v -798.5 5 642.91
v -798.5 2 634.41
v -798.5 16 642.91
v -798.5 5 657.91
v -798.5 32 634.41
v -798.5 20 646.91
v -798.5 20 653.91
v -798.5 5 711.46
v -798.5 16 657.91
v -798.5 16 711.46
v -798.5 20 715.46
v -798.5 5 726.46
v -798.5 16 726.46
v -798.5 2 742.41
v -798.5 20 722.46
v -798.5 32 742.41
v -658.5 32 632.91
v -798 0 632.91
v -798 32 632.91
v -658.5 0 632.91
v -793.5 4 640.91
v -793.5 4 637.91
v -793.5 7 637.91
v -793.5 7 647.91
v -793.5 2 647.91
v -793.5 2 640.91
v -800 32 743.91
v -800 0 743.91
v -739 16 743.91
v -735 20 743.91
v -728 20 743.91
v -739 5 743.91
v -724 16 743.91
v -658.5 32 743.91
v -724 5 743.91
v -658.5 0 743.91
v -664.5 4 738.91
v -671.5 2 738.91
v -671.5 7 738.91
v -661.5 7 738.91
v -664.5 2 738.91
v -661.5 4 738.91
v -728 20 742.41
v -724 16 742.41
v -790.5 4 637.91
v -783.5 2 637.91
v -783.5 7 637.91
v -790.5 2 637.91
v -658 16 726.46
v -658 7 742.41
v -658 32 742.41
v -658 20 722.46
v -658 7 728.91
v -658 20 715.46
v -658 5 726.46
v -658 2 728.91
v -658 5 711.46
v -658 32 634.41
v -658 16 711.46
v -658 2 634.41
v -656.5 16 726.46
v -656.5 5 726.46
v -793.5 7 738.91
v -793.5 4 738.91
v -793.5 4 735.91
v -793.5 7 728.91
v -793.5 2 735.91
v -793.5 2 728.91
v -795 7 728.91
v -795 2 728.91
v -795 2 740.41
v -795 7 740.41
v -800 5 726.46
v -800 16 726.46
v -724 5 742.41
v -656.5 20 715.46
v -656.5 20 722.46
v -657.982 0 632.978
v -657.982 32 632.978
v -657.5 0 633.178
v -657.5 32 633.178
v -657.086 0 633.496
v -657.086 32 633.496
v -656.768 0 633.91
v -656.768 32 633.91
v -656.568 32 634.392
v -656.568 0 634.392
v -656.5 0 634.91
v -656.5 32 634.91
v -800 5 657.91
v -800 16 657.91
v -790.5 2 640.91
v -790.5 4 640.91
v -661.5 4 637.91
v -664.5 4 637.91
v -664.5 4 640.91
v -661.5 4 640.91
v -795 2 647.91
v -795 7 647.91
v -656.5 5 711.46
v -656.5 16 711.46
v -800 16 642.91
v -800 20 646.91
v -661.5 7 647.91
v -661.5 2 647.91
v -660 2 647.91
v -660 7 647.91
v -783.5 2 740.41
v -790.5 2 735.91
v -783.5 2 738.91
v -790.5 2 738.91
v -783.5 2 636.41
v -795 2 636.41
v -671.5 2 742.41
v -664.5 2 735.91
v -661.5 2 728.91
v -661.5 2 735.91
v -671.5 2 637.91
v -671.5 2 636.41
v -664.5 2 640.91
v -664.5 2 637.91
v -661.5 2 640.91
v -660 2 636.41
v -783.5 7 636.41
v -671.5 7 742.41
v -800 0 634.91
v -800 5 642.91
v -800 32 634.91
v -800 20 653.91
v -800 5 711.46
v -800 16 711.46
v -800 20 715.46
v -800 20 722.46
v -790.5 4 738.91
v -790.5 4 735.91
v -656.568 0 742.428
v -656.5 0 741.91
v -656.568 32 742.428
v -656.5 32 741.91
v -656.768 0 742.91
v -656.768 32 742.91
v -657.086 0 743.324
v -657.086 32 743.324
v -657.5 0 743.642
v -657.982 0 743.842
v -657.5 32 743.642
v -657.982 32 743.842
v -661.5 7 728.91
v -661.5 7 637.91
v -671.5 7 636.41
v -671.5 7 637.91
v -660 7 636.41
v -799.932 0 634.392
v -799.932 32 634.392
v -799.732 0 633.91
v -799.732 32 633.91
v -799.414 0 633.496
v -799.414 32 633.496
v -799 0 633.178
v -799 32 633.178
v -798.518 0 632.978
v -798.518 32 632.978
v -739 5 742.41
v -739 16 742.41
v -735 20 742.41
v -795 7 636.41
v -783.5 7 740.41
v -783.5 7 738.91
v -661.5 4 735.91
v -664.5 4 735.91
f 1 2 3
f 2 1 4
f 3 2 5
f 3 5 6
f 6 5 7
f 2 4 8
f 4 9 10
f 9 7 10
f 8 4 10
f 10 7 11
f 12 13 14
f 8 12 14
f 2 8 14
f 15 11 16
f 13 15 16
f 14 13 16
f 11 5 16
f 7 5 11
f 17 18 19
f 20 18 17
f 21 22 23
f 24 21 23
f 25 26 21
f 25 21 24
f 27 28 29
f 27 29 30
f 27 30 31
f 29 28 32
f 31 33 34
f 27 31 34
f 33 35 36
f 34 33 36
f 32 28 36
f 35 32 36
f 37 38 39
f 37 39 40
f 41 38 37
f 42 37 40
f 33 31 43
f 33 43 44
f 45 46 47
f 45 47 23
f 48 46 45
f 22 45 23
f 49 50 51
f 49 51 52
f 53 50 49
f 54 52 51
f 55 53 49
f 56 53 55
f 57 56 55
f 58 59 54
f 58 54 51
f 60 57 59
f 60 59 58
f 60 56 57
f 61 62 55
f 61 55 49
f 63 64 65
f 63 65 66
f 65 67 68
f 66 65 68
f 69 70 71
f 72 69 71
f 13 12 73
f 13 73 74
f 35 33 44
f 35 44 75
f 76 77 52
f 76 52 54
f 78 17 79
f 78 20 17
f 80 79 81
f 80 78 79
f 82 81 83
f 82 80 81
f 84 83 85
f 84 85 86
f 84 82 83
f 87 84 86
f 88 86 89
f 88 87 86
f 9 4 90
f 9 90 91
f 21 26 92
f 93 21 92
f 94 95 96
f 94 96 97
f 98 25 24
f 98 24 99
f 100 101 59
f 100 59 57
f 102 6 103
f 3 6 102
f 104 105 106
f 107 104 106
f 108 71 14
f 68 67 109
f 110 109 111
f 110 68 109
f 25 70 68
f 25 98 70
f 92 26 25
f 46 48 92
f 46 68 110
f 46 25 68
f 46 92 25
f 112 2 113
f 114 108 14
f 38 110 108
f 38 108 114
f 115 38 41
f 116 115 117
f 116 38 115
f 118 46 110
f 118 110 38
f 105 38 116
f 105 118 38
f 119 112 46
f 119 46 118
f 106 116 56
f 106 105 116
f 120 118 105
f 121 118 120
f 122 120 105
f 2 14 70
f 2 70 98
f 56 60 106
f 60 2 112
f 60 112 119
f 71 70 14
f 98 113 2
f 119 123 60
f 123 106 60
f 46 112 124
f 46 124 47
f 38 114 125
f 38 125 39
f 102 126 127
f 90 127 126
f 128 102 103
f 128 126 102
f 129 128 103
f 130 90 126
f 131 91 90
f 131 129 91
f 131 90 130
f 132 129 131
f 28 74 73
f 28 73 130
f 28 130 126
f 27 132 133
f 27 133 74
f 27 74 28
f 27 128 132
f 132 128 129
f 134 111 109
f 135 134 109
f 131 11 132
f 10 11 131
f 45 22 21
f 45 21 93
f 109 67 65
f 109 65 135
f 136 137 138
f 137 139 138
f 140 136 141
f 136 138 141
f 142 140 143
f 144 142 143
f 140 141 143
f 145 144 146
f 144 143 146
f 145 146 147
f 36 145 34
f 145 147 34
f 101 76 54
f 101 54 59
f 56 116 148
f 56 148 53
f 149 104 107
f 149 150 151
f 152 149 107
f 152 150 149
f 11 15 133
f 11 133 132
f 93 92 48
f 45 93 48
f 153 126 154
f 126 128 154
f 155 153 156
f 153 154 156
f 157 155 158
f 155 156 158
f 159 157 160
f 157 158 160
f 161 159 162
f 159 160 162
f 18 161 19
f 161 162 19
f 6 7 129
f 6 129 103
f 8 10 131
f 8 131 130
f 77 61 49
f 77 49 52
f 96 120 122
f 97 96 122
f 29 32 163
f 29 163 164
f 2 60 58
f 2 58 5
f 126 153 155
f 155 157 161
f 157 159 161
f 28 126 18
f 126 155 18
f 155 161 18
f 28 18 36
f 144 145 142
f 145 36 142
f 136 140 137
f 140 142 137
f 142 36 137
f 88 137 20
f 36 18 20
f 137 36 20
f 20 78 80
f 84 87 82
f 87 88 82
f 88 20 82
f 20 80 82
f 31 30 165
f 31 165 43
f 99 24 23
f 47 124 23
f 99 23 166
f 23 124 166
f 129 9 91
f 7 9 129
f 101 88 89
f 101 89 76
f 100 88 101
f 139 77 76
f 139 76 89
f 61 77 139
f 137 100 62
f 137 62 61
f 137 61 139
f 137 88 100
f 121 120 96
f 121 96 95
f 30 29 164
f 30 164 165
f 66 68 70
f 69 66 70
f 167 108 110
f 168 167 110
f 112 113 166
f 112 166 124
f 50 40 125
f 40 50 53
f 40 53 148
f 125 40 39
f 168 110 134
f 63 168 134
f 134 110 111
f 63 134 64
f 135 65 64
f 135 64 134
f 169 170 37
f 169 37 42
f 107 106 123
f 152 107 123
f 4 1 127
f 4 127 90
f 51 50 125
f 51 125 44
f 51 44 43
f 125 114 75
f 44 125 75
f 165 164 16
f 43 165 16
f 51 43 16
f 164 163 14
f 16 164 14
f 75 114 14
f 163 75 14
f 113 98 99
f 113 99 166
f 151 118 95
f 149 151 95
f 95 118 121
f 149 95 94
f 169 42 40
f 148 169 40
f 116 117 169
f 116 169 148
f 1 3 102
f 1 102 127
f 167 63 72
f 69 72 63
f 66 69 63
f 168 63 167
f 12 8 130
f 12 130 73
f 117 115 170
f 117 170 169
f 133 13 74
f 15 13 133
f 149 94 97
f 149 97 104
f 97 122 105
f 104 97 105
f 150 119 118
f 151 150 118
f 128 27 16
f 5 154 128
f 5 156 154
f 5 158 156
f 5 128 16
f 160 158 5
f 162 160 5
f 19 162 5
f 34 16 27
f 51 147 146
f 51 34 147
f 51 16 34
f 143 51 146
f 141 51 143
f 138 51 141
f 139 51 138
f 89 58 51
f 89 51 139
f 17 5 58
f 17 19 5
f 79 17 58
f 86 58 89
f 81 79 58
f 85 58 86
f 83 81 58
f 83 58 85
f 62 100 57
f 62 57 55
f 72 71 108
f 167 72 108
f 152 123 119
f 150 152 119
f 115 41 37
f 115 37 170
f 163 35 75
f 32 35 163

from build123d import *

# Parameters (mm, degrees)
SKETCH1_W                = 1600
SKETCH1_H                = 1600
BOSS_EXTRUDE1_DEPTH      = 2
SKETCH2_R                = 1.585
BOSS_EXTRUDE2_DEPTH      = 5
SKETCH3_W                = 1.5
SKETCH3_H                = 10.8
SKETCH3_H_2              = 16.825
BOSS_EXTRUDE3_DEPTH      = 30
CUT_EXTRUDE1_DEPTH       = 1132.768527571
CUT_EXTRUDE1_DEPTH_BACK  = 1132.768527571
SKETCH5_OUTSIDE_W        = 2054.594
SKETCH5_OUTSIDE_H        = 2054.594
SKETCH5_OUTSIDE_W_2      = 200
SKETCH5_OUTSIDE_H_2      = 200
SKETCH6_W                = 200
SKETCH6_H                = 97
BOSS_EXTRUDE4_DEPTH      = 2
BOSS_EXTRUDE6_DEPTH      = 30
CUT_EXTRUDE7_START       = -2
CUT_EXTRUDE7_DEPTH       = 32
SKETCH15_W               = 48.54
SKETCH15_H               = 10.95
BOSS_EXTRUDE8_DEPTH      = 1.5
CHAMFER1_SIZE            = 3
CUT_EXTRUDE9_DEPTH       = 1132.768527571
CUT_EXTRUDE9_DEPTH_BACK  = 1132.768527571
SKETCH16_W               = 83.170959918
SKETCH16_H               = 74.318470717
BOSS_EXTRUDE9_DEPTH      = 30
CUT_EXTRUDE8_DEPTH       = 814.397965328
CUT_EXTRUDE8_DEPTH_BACK  = 814.397965328
SKETCH18_W               = 20.53541424
SKETCH18_H               = 18.617271152
BOSS_EXTRUDE10_DEPTH     = 1.5
BOSS_EXTRUDE11_DEPTH     = 5
SKETCH20_W               = 3
SKETCH20_H               = 3
BOSS_EXTRUDE12_DEPTH     = 2
FILLET1_R                = 2
BOSS_EXTRUDE13_DEPTH     = 30
CUT_EXTRUDE10_DEPTH      = 1132.823307765
CUT_EXTRUDE10_DEPTH_BACK = 1132.823307765
SKETCH22_W               = 118.842145749
SKETCH22_H               = 72.51699158
CUT_EXTRUDE11_DEPTH      = 20


# Read off the part's stored shape, not the designer's step: Cut-Extrude7
with BuildPart() as part:
    # Sketch1 → Boss-Extrude1 (new body)
    with BuildSketch(Plane(origin=(0, 0, 0), x_dir=(1, 0, 0), z_dir=(0, 1, 0))):
        Rectangle(SKETCH1_W, SKETCH1_H)
    extrude(amount=BOSS_EXTRUDE1_DEPTH)

    # Sketch2 → Boss-Extrude2 (add)
    with BuildSketch(Plane(origin=(0, 2, 0), x_dir=(1, 0, 0), z_dir=(0, 1, 0))):
        with Locations(Location((-782.85, -746.2, 0), (0, 0, 270))):
            Circle(SKETCH2_R)
        with Locations(Location((-732.05, -761.44, 0), (0, 0, 270))):
            Circle(SKETCH2_R)
        with Locations(Location((-784.12, -794.46, 0), (0, 0, 270))):
            Circle(SKETCH2_R)
        with Locations(Location((-732.05, -789.38, 0), (0, 0, 270))):
            Circle(SKETCH2_R)
    extrude(amount=BOSS_EXTRUDE2_DEPTH)

    # Sketch3 → Boss-Extrude3 (add)
    with BuildSketch(Plane(origin=(0, 2, 0), x_dir=(1, 0, 0), z_dir=(0, 1, 0))):
        with Locations((-799.25, -746.06)):
            Rectangle(SKETCH3_W, SKETCH3_H)
        Polygon((-798.5, -800), (-800, -800), (-800, -795.325), (-798.5, -795.325), (-798.5, -798.5), (-648.5, -798.5), (-648.5, -800), align=None)
        with Locations((-799.25, -774.9125)):
            Rectangle(SKETCH3_W, SKETCH3_H_2)
    extrude(amount=BOSS_EXTRUDE3_DEPTH)

    # Sketch5 outside → Cut-Extrude1 (cut, two sides: drawn at the far end of the back side and taken through both)
    with BuildSketch(Plane(origin=(0, 2, 0), x_dir=(1, 0, 0), z_dir=(0, 1, 0)).offset(-CUT_EXTRUDE1_DEPTH_BACK)):
        Rectangle(SKETCH5_OUTSIDE_W, SKETCH5_OUTSIDE_H)
        with Locations((-700, -700)):
            Rectangle(SKETCH5_OUTSIDE_W_2, SKETCH5_OUTSIDE_H_2, mode=Mode.SUBTRACT)
    extrude(amount=CUT_EXTRUDE1_DEPTH + CUT_EXTRUDE1_DEPTH_BACK, mode=Mode.SUBTRACT)

    # Sketch6 → Boss-Extrude4 (add)
    with BuildSketch(Plane(origin=(0, 2, 0), x_dir=(1, 0, 0), z_dir=(0, 1, 0))):
        with Locations((-698.5, -652.5)):
            Rectangle(SKETCH6_W, SKETCH6_H)
    extrude(amount=-BOSS_EXTRUDE4_DEPTH)

    # Sketch7 → Boss-Extrude6 (add)
    with BuildSketch(Plane(origin=(0, 2, 0), x_dir=(1, 0, 0), z_dir=(0, 1, 0))):
        Polygon((-798.5, -740.66), (-798.5, -601.5), (-601.5, -601.5), (-601.5, -605.5), (-600, -605.5), (-600, -699.5), (-601.5, -699.5), (-601.5, -798.5), (-648.5, -798.5), (-648.5, -800), (-600, -800), (-600, -701), (-598.5, -701), (-598.5, -604), (-600, -604), (-600, -600), (-800, -600), (-800, -740.66), align=None)
    extrude(amount=BOSS_EXTRUDE6_DEPTH)

    # Cut-Extrude7 outline → Cut-Extrude7 (cut)
    with BuildSketch(Plane(origin=(0, 2, 0), x_dir=(1, 0, 0), z_dir=(0, 1, 0)).offset(CUT_EXTRUDE7_START)):
        Polygon((-656.5, -632.91), (-656.5, -800), (-600, -800), (-600, -701), (-598.5, -701), (-598.5, -604), (-600, -604), (-600, -600), (-800, -600), (-800, -632.91), align=None)
    extrude(amount=CUT_EXTRUDE7_DEPTH, mode=Mode.SUBTRACT)

    # Sketch15 → Boss-Extrude8 (add)
    with BuildSketch(Plane.ZY.offset(800)):
        with Locations((775.73, 26.525)):
            Rectangle(SKETCH15_W, SKETCH15_H)
    extrude(amount=-BOSS_EXTRUDE8_DEPTH)

    # Chamfer1
    chamfer1_edges = [part.edges().sort_by_distance(p)[0] for p in [
        (-799.25, 21.05, 766.5),
        (-799.25, 21.05, 795.325),
        (-799.25, 21.05, 751.46),
        (-799.25, 21.05, 783.325),
    ]]
    chamfer(chamfer1_edges, length=CHAMFER1_SIZE)

    # Sketch16 → Cut-Extrude9 (cut, two sides: drawn at the far end of the back side and taken through both)
    with BuildSketch(Plane(origin=(0, 2, 0), x_dir=(1, 0, 0), z_dir=(0, 1, 0)).offset(-CUT_EXTRUDE9_DEPTH_BACK)):
        with Locations((-682.924520041, -781.069235359)):
            Rectangle(SKETCH16_W, SKETCH16_H)
    extrude(amount=CUT_EXTRUDE9_DEPTH + CUT_EXTRUDE9_DEPTH_BACK, mode=Mode.SUBTRACT)

    # Sketch17 → Boss-Extrude9 (add)
    with BuildSketch(Plane(origin=(0, 2, 0), x_dir=(1, 0, 0), z_dir=(0, 1, 0))):
        Polygon((-798.5, -632.91), (-656.5, -632.91), (-656.5, -743.91), (-724.51, -743.91), (-724.51, -800), (-726.01, -800), (-726.01, -742.41), (-658, -742.41), (-658, -634.41), (-798.5, -634.41), align=None)
    extrude(amount=BOSS_EXTRUDE9_DEPTH)

    # Sketch14 → Cut-Extrude8 (cut, two sides: drawn at the far end of the back side and taken through both)
    with BuildSketch(Plane.ZY.offset(800).offset(-CUT_EXTRUDE8_DEPTH_BACK)):
        Polygon((642.91, 5), (657.91, 5), (657.91, 16), (653.91, 20), (646.91, 20), (642.91, 16), align=None)
        Polygon((711.46, 5), (726.46, 5), (726.46, 16), (722.46, 20), (715.46, 20), (711.46, 16), align=None)
    extrude(amount=CUT_EXTRUDE8_DEPTH + CUT_EXTRUDE8_DEPTH_BACK, mode=Mode.SUBTRACT)

    # Sketch18 → Boss-Extrude10 (add)
    with BuildSketch(Plane(origin=(-656.5, 0, 0), x_dir=(0, 0, -1), z_dir=(1, 0, 0))):
        with Locations((-651.07097558, 11.926550953)):
            Rectangle(SKETCH18_W, SKETCH18_H)
    extrude(amount=-BOSS_EXTRUDE10_DEPTH)

    # Sketch19 → Boss-Extrude11 (add)
    with BuildSketch(Plane(origin=(0, 2, 0), x_dir=(1, 0, 0), z_dir=(0, 1, 0))):
        Polygon((-793.5, -647.91), (-795, -647.91), (-795, -636.41), (-783.5, -636.41), (-783.5, -637.91), (-793.5, -637.91), align=None)
        Polygon((-661.5, -647.91), (-660, -647.91), (-660, -636.41), (-671.5, -636.41), (-671.5, -637.91), (-661.5, -637.91), align=None)
        Polygon((-661.5, -728.91), (-658, -728.91), (-658, -742.41), (-671.5, -742.41), (-671.5, -738.91), (-661.5, -738.91), align=None)
        Polygon((-793.5, -728.91), (-795, -728.91), (-795, -740.41), (-783.5, -740.41), (-783.5, -738.91), (-793.5, -738.91), align=None)
    extrude(amount=BOSS_EXTRUDE11_DEPTH)

    # Sketch20 → Boss-Extrude12 (add)
    with BuildSketch(Plane(origin=(0, 2, 0), x_dir=(1, 0, 0), z_dir=(0, 1, 0))):
        with Locations((-792, -639.41)):
            Rectangle(SKETCH20_W, SKETCH20_H)
        with Locations((-663, -639.41)):
            Rectangle(SKETCH20_W, SKETCH20_H)
        with Locations((-663, -737.41)):
            Rectangle(SKETCH20_W, SKETCH20_H)
        with Locations((-792, -737.41)):
            Rectangle(SKETCH20_W, SKETCH20_H)
    extrude(amount=BOSS_EXTRUDE12_DEPTH)

    # Fillet1
    fillet1_edges = [part.edges().sort_by_distance(p)[0] for p in [
        (-656.5, 16, 632.91),
        (-800, 16, 632.91),
        (-656.5, 16, 743.91),
        (-724.51, 16, 800),
        (-724.51, 16, 743.91),
        (-800, 16, 800),
    ]]
    fillet(fillet1_edges, radius=FILLET1_R)

    # Sketch21 → Boss-Extrude13 (add)
    with BuildSketch(Plane(origin=(0, 2, 0), x_dir=(1, 0, 0), z_dir=(0, 1, 0))):
        Polygon((-726.01, -742.41), (-798.5, -742.41), (-800, -743.91), (-720.182968703, -743.91), align=None)
    extrude(amount=BOSS_EXTRUDE13_DEPTH)

    # Sketch22 → Cut-Extrude10 (cut, two sides: drawn at the far end of the back side and taken through both)
    with BuildSketch(Plane(origin=(0, 32, 0), x_dir=(1, 0, 0), z_dir=(0, 1, 0)).offset(-CUT_EXTRUDE10_DEPTH_BACK)):
        with Locations((-761.569685202, -780.16849579)):
            Rectangle(SKETCH22_W, SKETCH22_H)
    extrude(amount=CUT_EXTRUDE10_DEPTH + CUT_EXTRUDE10_DEPTH_BACK, mode=Mode.SUBTRACT)

    # Sketch23 → Cut-Extrude11 (cut)
    with BuildSketch(Plane.XY.offset(743.91)):
        Polygon((-735, 20), (-728, 20), (-724, 16), (-724, 5), (-739, 5), (-739, 16), align=None)
    extrude(amount=-CUT_EXTRUDE11_DEPTH, mode=Mode.SUBTRACT)


solid = part.part
